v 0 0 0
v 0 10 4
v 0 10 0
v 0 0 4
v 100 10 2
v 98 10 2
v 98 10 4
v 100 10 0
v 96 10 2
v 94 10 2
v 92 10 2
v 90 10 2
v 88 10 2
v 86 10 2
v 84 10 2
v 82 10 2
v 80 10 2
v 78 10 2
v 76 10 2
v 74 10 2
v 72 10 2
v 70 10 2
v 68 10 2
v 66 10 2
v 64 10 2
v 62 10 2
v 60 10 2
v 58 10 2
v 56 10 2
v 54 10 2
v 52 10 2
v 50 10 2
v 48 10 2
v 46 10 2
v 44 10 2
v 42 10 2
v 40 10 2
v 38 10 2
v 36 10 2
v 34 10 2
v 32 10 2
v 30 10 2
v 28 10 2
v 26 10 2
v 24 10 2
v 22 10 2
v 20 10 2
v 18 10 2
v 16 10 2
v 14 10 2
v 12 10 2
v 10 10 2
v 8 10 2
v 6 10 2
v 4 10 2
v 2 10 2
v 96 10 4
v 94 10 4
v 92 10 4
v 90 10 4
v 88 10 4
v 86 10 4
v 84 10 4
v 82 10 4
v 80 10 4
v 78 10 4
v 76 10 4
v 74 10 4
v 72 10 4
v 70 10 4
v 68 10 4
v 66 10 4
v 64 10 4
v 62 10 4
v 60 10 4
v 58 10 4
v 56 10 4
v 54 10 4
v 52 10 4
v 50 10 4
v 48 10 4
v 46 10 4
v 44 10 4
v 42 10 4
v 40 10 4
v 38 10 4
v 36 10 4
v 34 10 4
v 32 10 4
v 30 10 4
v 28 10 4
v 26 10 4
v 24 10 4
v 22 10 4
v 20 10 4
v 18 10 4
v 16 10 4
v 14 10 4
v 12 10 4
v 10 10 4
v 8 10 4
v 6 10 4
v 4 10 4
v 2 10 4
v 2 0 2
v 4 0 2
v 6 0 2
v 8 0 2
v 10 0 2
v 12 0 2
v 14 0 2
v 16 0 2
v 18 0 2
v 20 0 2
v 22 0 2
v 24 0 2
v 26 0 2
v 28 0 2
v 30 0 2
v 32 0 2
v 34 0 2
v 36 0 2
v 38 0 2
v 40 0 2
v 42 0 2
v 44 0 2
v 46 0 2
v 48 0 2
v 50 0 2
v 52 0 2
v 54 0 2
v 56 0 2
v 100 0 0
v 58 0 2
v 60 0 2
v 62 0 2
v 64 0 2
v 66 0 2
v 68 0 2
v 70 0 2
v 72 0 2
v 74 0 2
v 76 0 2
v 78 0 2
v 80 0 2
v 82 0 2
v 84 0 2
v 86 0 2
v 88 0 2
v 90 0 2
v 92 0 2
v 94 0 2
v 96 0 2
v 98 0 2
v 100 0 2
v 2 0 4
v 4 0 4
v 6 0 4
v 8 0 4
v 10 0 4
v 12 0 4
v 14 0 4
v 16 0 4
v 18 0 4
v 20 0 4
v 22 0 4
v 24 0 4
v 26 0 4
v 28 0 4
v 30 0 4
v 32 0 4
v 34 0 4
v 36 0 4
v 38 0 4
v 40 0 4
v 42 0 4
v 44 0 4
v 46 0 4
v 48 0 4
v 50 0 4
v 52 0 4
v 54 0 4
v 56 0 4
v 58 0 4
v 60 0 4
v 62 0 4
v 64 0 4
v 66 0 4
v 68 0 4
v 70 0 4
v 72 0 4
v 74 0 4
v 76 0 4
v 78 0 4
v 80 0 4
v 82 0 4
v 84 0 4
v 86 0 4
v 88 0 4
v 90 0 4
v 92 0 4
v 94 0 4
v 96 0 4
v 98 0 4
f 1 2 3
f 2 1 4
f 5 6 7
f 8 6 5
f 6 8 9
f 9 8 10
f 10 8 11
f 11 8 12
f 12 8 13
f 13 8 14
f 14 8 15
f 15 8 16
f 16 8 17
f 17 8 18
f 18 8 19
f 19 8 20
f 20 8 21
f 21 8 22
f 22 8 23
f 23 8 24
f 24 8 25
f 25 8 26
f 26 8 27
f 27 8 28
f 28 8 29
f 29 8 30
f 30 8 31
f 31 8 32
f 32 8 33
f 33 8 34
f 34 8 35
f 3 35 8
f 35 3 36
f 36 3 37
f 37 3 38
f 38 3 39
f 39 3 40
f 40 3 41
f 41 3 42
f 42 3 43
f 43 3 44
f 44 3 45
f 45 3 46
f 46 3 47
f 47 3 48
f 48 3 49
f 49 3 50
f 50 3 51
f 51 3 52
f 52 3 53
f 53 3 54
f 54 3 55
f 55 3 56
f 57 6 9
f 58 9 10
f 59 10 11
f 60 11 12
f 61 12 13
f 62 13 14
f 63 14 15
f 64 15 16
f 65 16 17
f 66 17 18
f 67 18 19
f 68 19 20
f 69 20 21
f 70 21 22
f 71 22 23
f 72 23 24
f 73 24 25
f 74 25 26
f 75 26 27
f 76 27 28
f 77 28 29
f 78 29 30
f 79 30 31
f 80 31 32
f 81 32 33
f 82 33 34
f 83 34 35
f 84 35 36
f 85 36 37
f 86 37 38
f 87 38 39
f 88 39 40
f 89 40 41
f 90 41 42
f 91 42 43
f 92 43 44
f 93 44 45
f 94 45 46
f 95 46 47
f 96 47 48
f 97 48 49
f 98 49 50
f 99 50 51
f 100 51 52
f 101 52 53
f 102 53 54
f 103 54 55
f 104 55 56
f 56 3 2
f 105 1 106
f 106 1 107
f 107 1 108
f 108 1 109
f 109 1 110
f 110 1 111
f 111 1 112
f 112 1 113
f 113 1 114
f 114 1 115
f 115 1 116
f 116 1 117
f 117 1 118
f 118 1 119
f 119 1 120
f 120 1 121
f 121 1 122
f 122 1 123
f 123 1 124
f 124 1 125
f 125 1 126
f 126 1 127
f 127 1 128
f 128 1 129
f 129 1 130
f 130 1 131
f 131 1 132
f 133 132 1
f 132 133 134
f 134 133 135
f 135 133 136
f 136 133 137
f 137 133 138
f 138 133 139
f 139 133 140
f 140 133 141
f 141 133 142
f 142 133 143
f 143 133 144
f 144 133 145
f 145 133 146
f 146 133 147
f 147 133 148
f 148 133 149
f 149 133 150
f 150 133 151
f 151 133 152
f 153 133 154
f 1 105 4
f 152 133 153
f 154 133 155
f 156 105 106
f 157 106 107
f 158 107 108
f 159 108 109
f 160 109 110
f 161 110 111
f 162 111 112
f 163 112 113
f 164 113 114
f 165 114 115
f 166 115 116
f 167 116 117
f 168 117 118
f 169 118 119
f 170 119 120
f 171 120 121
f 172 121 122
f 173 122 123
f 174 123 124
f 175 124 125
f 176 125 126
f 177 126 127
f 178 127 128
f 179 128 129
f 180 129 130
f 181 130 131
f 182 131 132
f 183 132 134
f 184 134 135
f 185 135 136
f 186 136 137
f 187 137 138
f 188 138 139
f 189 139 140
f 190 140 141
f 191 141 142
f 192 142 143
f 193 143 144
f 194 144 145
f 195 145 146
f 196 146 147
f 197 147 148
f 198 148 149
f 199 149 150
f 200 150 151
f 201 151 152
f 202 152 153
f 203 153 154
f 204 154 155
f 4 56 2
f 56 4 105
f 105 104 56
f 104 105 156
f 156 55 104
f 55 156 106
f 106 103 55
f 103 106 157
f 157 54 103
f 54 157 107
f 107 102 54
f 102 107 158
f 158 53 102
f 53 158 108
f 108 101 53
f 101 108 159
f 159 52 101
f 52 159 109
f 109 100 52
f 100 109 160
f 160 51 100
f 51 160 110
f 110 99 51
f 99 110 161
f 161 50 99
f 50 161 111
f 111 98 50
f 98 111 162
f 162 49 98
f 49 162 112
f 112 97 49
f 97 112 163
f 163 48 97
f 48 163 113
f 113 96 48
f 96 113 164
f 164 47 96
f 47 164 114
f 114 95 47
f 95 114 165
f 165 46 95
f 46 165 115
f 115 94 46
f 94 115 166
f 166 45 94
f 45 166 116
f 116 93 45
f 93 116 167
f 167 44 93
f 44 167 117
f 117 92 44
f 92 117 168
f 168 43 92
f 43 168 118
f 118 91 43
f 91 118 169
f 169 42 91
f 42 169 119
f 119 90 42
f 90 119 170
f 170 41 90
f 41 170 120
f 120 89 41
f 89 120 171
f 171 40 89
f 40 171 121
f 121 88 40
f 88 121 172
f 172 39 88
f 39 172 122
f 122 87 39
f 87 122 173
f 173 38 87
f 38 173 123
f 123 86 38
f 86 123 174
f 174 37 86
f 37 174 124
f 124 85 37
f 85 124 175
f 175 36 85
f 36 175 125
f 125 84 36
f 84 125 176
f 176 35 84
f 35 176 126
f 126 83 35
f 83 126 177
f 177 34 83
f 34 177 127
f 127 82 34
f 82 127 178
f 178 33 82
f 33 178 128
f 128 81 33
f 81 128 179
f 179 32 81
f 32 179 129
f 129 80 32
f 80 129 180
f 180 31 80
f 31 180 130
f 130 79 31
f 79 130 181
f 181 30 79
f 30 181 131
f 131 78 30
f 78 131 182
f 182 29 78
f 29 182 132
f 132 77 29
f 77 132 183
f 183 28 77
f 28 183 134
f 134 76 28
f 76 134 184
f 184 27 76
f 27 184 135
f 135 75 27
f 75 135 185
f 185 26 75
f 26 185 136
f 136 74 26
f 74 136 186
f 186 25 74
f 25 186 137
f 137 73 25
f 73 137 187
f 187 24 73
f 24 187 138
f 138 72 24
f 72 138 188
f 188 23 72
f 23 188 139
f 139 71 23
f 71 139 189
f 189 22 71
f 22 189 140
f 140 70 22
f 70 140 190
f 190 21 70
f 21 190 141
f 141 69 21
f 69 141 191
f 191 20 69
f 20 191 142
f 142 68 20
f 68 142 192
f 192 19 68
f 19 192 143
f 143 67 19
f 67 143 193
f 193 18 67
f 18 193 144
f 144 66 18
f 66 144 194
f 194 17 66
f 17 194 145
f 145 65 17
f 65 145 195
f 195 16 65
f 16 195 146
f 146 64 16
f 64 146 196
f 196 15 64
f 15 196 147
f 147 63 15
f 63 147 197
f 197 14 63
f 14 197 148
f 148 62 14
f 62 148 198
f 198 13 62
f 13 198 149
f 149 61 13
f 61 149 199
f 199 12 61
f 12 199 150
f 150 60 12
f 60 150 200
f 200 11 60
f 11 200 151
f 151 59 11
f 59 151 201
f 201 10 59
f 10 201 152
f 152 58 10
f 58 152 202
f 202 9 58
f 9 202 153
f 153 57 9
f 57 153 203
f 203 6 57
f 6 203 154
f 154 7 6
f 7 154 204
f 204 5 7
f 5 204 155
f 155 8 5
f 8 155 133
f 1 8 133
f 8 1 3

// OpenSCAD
cube([100,10,2]);
for ( i = [0 :2: 99] )
{
translate([i,0,0])
difference(){
translate([0,0,2])cube([2,10,2]);
translate([0,-1,4])rotate([0,45,0])cube([3,12,3]);

}
}
